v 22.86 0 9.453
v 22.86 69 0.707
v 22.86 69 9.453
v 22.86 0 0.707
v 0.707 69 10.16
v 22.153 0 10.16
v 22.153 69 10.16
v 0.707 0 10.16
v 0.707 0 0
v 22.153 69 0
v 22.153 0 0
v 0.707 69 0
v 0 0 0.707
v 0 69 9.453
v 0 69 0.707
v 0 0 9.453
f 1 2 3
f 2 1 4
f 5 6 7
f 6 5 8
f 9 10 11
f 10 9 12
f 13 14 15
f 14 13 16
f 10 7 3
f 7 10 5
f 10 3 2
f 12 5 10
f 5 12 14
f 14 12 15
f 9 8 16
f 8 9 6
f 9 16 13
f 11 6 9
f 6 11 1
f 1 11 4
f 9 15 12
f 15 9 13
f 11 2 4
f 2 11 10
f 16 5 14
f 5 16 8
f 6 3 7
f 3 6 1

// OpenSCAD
// Waveguide plug model

// Waveguide dimensions
WGw = 22.86; // Width of waveguide
WGh = 10.16; // Height of waveguide
WGl = 69;    // Length of waveguide

// Technological parameters
marginXY = 0;      // XY dimension margin
marginZ = 0;      // Z dimension margin

CCdim = 1;           // Corner cut definition

// Corner cut
module Ccut(){
        translate([0, ( WGl+marginXY )/2 , 0])rotate([0,45,0])cube([CCdim, WGl+2*marginXY , CCdim], center = true);
    }

// Waveguide plug
module WGplug(){
    
    difference(){
        // Main plug
        cube([WGw-marginXY, WGl-marginXY , WGh-marginZ]);
        
        translate([0,0,0]) Ccut(); // Bottom left 
        translate([WGw-marginXY,0,0]) Ccut(); // Bottom right 
        translate([0,0,WGh-marginZ]) Ccut(); // Top Left
        translate([WGw-marginXY,0,WGh-marginZ]) Ccut(); // Top Right
        
    }
    
}

// Final part render
WGplug();
